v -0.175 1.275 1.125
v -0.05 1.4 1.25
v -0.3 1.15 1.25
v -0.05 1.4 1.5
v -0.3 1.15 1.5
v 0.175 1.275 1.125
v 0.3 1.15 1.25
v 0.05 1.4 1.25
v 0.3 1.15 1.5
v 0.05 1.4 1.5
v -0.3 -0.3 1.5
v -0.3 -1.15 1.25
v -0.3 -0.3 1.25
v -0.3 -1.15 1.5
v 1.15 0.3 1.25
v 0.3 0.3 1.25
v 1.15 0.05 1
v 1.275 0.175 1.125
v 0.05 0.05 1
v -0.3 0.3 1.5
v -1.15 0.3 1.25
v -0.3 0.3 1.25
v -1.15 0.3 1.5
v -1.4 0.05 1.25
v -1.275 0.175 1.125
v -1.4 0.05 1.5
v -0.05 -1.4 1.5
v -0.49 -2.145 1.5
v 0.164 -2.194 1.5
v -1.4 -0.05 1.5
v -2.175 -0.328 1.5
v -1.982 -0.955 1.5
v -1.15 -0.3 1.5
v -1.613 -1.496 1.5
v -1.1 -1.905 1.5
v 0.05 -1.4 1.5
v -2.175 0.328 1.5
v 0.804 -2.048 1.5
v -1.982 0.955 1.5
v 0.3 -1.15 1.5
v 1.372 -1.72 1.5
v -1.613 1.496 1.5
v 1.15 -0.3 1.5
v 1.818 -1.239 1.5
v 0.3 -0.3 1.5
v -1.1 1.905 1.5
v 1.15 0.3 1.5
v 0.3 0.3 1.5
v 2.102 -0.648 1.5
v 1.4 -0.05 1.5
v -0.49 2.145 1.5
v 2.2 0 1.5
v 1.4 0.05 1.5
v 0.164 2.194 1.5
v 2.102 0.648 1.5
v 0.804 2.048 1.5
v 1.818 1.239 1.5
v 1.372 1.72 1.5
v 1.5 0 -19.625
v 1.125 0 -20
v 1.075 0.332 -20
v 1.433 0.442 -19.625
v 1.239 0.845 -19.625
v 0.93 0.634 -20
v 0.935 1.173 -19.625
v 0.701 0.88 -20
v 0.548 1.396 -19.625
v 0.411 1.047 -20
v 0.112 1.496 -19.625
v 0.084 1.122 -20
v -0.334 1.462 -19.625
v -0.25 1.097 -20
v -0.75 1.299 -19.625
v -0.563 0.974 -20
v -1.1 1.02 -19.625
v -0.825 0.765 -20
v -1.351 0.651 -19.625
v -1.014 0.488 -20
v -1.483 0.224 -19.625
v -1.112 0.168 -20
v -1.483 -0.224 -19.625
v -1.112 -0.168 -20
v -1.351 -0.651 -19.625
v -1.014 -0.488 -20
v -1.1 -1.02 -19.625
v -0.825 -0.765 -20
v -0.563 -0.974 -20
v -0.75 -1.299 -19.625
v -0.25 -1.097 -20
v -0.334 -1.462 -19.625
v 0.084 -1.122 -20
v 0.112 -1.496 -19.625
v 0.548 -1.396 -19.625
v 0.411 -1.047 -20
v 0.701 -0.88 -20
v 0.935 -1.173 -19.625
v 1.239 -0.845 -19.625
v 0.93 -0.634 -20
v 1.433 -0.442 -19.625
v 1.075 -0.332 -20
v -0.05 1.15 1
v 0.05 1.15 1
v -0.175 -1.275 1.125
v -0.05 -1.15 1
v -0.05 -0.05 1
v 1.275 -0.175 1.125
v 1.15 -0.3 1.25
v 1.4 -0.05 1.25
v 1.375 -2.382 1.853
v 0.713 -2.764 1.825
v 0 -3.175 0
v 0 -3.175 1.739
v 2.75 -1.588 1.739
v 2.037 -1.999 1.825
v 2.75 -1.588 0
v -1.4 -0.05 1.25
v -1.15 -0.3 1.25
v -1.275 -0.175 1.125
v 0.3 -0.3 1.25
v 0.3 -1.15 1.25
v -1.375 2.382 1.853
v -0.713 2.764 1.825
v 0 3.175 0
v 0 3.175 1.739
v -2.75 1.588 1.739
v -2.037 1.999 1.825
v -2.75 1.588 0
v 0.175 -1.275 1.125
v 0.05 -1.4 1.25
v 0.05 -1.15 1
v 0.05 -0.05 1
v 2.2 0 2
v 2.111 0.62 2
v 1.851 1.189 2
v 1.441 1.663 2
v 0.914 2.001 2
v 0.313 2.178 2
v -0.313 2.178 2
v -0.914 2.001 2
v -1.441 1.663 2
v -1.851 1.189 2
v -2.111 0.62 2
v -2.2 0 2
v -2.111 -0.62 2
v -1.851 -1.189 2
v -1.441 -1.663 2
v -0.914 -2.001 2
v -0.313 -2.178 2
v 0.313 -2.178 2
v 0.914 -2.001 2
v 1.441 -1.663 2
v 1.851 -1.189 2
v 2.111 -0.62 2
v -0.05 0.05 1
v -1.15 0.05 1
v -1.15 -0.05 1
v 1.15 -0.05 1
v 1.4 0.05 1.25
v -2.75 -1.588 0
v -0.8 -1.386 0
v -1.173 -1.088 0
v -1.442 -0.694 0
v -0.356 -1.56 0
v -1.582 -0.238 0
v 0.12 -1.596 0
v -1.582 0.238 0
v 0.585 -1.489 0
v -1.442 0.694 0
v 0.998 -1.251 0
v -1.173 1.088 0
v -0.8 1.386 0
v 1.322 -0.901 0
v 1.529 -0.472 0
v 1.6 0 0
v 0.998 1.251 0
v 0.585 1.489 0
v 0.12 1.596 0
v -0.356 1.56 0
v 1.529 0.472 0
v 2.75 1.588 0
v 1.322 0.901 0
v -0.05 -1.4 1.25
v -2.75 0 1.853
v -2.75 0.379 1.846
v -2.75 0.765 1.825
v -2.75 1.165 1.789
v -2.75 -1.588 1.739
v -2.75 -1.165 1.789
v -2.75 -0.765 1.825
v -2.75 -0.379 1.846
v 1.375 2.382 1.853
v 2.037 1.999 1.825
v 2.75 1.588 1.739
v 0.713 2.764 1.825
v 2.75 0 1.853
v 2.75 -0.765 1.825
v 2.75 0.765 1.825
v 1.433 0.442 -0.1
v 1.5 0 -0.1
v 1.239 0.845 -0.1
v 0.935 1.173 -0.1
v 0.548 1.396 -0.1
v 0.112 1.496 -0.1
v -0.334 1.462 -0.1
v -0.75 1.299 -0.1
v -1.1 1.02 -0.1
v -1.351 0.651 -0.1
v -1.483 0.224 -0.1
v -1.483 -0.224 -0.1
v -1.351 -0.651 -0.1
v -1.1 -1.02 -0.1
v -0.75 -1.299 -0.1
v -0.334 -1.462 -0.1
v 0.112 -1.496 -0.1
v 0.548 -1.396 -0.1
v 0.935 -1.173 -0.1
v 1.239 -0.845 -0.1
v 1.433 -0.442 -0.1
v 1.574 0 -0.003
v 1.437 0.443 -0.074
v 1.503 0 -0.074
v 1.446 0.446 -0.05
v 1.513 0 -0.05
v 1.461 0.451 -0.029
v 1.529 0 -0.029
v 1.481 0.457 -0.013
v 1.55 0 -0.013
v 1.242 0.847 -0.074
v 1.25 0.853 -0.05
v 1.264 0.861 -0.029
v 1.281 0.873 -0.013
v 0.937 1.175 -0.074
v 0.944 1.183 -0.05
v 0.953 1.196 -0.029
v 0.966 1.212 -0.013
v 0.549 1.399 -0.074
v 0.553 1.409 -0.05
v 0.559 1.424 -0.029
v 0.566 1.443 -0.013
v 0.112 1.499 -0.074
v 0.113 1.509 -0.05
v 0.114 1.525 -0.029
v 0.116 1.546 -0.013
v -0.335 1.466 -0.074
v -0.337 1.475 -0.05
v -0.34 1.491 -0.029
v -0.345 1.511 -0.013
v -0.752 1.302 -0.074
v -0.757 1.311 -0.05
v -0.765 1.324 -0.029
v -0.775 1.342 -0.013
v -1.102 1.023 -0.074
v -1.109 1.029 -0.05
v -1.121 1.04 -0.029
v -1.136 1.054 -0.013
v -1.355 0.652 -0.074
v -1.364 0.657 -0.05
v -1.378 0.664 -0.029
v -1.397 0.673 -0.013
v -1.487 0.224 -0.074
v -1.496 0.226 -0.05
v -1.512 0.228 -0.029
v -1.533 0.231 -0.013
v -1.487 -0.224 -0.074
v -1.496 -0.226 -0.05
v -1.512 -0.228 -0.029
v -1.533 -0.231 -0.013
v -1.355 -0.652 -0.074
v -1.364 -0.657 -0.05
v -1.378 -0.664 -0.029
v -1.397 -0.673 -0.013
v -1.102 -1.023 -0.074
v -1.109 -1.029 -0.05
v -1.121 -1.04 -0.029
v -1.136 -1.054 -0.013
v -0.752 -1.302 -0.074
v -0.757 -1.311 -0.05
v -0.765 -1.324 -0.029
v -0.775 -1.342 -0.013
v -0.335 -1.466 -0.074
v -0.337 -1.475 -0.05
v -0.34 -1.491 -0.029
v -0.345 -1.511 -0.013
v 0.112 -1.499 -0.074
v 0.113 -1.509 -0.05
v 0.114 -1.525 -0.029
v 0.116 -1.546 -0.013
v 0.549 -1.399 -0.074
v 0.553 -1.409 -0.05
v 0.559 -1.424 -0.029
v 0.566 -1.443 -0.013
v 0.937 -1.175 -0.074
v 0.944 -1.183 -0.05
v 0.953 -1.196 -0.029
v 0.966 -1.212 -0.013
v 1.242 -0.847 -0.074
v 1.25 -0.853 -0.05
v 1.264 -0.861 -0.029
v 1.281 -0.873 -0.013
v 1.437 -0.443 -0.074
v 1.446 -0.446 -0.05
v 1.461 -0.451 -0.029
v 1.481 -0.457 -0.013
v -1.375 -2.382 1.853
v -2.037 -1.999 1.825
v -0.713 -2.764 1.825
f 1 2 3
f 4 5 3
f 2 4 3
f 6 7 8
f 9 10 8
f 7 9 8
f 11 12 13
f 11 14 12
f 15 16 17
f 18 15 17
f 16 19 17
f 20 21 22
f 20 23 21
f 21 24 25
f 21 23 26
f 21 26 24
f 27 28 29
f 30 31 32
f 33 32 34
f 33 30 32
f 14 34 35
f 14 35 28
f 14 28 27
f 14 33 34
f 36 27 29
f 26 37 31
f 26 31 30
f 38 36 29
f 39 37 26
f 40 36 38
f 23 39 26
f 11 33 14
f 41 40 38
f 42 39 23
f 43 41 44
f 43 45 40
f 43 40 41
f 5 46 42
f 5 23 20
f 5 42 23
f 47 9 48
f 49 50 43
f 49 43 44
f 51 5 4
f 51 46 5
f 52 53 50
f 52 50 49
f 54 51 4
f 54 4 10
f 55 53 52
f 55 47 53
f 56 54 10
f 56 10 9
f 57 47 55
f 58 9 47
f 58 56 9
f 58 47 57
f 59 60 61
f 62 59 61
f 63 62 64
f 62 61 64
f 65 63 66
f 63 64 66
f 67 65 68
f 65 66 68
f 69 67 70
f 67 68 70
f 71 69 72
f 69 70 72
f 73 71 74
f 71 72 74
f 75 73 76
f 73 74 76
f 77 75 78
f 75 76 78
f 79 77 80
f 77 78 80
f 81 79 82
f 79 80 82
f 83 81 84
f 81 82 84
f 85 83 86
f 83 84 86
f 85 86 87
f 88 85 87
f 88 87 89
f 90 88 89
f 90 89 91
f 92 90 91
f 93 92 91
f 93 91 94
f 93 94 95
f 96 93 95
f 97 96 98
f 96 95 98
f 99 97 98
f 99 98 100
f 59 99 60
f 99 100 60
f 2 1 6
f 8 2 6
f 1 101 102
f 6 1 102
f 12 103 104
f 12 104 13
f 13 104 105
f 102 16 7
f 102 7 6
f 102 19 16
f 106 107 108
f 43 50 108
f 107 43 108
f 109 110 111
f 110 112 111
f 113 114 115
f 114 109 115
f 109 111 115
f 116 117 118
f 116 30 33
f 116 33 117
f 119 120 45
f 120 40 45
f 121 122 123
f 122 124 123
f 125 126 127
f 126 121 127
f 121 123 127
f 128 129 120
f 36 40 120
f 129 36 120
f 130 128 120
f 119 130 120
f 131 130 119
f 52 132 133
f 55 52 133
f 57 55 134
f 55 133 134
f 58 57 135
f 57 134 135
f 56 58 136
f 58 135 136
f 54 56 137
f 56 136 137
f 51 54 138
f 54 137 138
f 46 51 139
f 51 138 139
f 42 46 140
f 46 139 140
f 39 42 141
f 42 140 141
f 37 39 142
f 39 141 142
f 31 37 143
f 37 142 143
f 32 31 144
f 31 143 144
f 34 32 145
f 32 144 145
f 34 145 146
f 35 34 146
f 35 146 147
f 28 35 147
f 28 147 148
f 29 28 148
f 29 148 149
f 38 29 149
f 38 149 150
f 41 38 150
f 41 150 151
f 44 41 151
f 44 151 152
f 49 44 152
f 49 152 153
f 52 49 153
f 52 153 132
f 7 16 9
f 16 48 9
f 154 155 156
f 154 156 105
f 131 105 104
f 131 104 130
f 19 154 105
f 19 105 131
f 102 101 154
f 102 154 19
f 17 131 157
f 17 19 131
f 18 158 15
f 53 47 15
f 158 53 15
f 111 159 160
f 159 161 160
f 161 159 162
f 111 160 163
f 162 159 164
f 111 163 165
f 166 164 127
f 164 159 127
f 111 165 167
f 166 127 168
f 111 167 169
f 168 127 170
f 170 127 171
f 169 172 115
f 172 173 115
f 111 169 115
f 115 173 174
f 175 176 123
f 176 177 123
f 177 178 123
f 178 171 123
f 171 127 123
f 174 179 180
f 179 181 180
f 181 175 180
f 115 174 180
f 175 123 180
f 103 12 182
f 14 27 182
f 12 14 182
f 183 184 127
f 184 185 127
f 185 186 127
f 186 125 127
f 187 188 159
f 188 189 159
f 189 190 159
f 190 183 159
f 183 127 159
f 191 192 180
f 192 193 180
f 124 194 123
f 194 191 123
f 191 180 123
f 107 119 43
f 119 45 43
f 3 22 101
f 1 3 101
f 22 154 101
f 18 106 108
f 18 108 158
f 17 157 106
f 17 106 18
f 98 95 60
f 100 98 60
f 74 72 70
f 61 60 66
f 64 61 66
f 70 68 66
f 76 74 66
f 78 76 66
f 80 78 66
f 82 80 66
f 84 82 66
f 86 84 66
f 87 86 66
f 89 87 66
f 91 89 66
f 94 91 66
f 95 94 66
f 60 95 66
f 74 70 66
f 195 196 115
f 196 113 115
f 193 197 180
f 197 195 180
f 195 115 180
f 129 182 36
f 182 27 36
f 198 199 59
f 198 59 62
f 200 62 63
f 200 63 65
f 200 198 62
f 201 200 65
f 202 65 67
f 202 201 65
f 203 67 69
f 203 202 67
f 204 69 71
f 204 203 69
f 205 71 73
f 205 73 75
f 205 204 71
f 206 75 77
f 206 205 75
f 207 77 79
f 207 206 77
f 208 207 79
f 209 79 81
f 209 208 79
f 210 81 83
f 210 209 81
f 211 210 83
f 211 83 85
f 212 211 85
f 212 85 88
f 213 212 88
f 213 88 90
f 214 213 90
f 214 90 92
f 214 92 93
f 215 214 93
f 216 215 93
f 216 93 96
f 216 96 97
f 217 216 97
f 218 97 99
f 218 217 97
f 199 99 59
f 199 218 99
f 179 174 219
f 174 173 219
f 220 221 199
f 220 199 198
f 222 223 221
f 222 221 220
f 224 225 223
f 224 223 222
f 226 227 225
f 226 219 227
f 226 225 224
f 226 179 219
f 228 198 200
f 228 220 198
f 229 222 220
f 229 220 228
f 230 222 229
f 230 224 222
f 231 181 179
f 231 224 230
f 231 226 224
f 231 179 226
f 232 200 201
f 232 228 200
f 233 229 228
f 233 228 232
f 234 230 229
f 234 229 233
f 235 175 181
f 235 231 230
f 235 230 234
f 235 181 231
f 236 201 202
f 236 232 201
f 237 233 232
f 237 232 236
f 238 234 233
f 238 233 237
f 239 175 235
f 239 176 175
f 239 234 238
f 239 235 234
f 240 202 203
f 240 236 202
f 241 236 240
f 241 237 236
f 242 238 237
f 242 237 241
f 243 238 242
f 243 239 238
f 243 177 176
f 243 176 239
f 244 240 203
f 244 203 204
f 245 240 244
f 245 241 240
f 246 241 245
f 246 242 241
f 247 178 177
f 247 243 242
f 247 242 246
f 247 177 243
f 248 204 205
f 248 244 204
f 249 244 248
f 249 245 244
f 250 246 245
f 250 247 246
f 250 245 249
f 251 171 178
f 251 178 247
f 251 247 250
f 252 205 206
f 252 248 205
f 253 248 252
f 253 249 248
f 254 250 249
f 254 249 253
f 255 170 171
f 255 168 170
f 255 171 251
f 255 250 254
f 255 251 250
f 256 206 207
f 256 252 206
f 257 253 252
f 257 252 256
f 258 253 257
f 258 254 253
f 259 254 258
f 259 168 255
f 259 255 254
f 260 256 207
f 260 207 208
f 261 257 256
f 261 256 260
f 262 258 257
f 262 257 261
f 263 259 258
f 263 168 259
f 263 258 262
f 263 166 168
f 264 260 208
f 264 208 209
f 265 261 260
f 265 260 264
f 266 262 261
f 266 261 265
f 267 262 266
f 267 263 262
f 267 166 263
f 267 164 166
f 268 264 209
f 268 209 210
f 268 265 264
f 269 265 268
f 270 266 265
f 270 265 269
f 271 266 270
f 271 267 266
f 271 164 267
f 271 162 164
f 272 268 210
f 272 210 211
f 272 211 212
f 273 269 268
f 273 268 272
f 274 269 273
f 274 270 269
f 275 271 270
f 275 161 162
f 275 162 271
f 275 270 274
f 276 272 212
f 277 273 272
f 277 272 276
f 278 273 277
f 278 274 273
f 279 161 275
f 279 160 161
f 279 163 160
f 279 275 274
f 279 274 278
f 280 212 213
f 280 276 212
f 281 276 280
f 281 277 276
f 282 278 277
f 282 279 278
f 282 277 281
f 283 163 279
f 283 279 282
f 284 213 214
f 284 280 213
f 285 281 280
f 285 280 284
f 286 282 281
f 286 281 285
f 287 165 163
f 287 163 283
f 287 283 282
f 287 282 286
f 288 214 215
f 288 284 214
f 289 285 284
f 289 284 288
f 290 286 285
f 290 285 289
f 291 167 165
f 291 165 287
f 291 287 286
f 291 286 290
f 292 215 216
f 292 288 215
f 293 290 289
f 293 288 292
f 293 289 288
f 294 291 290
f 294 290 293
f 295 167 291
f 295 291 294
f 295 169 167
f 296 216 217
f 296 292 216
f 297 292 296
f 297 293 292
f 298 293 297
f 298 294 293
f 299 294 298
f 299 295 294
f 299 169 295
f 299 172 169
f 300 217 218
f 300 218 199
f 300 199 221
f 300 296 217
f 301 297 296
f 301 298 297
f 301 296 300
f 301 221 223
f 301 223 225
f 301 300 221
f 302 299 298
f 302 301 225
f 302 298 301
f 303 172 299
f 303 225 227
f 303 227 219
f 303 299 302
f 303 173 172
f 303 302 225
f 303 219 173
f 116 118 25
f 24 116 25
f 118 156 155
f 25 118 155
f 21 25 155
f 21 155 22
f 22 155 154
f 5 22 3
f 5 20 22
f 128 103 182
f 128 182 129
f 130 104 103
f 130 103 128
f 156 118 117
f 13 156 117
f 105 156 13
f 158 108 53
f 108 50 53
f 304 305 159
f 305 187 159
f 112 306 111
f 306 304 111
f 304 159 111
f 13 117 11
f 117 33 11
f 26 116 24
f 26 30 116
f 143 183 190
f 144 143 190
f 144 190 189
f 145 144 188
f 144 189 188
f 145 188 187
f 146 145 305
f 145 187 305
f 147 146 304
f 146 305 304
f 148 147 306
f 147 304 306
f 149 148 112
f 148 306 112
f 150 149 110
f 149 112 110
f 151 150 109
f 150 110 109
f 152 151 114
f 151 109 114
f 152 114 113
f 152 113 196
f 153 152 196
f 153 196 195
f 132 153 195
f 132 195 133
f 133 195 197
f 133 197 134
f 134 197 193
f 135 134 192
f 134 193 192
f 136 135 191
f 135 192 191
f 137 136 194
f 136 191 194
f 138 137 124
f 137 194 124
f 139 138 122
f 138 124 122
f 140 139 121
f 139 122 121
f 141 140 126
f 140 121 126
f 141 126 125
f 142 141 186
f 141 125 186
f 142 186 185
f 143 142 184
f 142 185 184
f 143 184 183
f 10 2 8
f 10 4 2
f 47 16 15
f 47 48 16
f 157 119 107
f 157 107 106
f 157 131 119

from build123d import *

# Parameters (mm, degrees)
EXTRUDE_1_DEPTH     = 2
SKETCH_3_R          = 1.5
EXTRUDE_3_DEPTH     = 20
SKETCH_7_R          = 2.2
CUT_EXTRUDE_3_DEPTH = 0.5
SKETCH_6_W          = 2.8
SKETCH_6_H          = 0.6
SKETCH_6_W_2        = 0.6
SKETCH_6_H_2        = 2.8
CUT_EXTRUDE_1_DEPTH = 0.5
CHAMFER_1_SIZE      = 0.375
FILLET_1_R          = 0.1
CHAMFER_2_SIZE      = 0.25
CHAMFER_3_SIZE      = 0.25


with BuildPart() as part:
    # 草图1 → 凸台-拉伸1 (new body)
    with BuildSketch(Plane.XY):
        Polygon((0, 3.175426481), (-2.75, 1.58771324), (-2.75, -1.58771324), (0, -3.175426481), (2.75, -1.58771324), (2.75, 1.58771324), align=None)
    extrude(amount=EXTRUDE_1_DEPTH)

    # 草图3 → 凸台-拉伸3 (add)
    with BuildSketch(Plane.XY):
        Circle(SKETCH_3_R)
    extrude(amount=-EXTRUDE_3_DEPTH)

    # 草图4 → 切除-旋转1 (revolve, cut)
    with BuildSketch(Plane(origin=(0, 0, 0), x_dir=(0, 0, -1), z_dir=(1, 0, 0)), mode=Mode.PRIVATE) as cut_revolve_1_sk:
        Polygon((-2, 11), (-2, 2.2), (0.357952893, 11), align=None)
    revolve(cut_revolve_1_sk.sketch.rotate(Axis((0, 0, -2.242017917), (0, 0, 1)), 90), axis=Axis((0, 0, -2.242017917), (0, 0, 1)), mode=Mode.SUBTRACT)

    # 草图7 → 切除-拉伸3 (cut)
    with BuildSketch(Plane.XY.offset(2)):
        Circle(SKETCH_7_R)
    extrude(amount=-CUT_EXTRUDE_3_DEPTH, mode=Mode.SUBTRACT)

    # 草图6 → 切除-拉伸1 (cut)
    with BuildSketch(Plane.XY.offset(1.5)):
        Rectangle(SKETCH_6_W, SKETCH_6_H)
        Rectangle(SKETCH_6_W_2, SKETCH_6_H_2)
    extrude(amount=-CUT_EXTRUDE_1_DEPTH, mode=Mode.SUBTRACT)

    # 倒角1
    chamfer_1_edges = [part.edges().sort_by_distance(p)[0] for p in [
        (-1.5, 0, -20),
    ]]
    chamfer(chamfer_1_edges, length=CHAMFER_1_SIZE)

    # 圆角1
    fillet_1_edges = [part.edges().sort_by_distance(p)[0] for p in [
        (-1.5, 0, 0),
    ]]
    fillet(fillet_1_edges, radius=FILLET_1_R)

    # 倒角2
    chamfer_2_edges = [part.edges().sort_by_distance(p)[0] for p in [
        (0.3, 0.85, 1),
        (0.85, 0.3, 1),
        (-0.3, -0.85, 1),
        (-1.4, 0, 1),
        (-0.85, 0.3, 1),
        (-0.3, 0.85, 1),
        (0, 1.4, 1),
        (0, -1.4, 1),
        (0.3, -0.85, 1),
        (-0.85, -0.3, 1),
        (1.4, 0, 1),
        (0.85, -0.3, 1),
    ]]
    chamfer(chamfer_2_edges, length=CHAMFER_2_SIZE)

    # 倒角3
    chamfer_3_edges = [part.edges().sort_by_distance(p)[0] for p in [
        (1.4, 0.3, 1.375),
        (1.4, -0.3, 1.375),
        (0.3, -1.4, 1.375),
        (-0.3, -1.4, 1.375),
        (-1.4, -0.3, 1.375),
        (-1.4, 0.3, 1.375),
        (-0.3, 1.4, 1.375),
        (0.3, 1.4, 1.375),
    ]]
    chamfer(chamfer_3_edges, length=CHAMFER_3_SIZE)


solid = part.part
